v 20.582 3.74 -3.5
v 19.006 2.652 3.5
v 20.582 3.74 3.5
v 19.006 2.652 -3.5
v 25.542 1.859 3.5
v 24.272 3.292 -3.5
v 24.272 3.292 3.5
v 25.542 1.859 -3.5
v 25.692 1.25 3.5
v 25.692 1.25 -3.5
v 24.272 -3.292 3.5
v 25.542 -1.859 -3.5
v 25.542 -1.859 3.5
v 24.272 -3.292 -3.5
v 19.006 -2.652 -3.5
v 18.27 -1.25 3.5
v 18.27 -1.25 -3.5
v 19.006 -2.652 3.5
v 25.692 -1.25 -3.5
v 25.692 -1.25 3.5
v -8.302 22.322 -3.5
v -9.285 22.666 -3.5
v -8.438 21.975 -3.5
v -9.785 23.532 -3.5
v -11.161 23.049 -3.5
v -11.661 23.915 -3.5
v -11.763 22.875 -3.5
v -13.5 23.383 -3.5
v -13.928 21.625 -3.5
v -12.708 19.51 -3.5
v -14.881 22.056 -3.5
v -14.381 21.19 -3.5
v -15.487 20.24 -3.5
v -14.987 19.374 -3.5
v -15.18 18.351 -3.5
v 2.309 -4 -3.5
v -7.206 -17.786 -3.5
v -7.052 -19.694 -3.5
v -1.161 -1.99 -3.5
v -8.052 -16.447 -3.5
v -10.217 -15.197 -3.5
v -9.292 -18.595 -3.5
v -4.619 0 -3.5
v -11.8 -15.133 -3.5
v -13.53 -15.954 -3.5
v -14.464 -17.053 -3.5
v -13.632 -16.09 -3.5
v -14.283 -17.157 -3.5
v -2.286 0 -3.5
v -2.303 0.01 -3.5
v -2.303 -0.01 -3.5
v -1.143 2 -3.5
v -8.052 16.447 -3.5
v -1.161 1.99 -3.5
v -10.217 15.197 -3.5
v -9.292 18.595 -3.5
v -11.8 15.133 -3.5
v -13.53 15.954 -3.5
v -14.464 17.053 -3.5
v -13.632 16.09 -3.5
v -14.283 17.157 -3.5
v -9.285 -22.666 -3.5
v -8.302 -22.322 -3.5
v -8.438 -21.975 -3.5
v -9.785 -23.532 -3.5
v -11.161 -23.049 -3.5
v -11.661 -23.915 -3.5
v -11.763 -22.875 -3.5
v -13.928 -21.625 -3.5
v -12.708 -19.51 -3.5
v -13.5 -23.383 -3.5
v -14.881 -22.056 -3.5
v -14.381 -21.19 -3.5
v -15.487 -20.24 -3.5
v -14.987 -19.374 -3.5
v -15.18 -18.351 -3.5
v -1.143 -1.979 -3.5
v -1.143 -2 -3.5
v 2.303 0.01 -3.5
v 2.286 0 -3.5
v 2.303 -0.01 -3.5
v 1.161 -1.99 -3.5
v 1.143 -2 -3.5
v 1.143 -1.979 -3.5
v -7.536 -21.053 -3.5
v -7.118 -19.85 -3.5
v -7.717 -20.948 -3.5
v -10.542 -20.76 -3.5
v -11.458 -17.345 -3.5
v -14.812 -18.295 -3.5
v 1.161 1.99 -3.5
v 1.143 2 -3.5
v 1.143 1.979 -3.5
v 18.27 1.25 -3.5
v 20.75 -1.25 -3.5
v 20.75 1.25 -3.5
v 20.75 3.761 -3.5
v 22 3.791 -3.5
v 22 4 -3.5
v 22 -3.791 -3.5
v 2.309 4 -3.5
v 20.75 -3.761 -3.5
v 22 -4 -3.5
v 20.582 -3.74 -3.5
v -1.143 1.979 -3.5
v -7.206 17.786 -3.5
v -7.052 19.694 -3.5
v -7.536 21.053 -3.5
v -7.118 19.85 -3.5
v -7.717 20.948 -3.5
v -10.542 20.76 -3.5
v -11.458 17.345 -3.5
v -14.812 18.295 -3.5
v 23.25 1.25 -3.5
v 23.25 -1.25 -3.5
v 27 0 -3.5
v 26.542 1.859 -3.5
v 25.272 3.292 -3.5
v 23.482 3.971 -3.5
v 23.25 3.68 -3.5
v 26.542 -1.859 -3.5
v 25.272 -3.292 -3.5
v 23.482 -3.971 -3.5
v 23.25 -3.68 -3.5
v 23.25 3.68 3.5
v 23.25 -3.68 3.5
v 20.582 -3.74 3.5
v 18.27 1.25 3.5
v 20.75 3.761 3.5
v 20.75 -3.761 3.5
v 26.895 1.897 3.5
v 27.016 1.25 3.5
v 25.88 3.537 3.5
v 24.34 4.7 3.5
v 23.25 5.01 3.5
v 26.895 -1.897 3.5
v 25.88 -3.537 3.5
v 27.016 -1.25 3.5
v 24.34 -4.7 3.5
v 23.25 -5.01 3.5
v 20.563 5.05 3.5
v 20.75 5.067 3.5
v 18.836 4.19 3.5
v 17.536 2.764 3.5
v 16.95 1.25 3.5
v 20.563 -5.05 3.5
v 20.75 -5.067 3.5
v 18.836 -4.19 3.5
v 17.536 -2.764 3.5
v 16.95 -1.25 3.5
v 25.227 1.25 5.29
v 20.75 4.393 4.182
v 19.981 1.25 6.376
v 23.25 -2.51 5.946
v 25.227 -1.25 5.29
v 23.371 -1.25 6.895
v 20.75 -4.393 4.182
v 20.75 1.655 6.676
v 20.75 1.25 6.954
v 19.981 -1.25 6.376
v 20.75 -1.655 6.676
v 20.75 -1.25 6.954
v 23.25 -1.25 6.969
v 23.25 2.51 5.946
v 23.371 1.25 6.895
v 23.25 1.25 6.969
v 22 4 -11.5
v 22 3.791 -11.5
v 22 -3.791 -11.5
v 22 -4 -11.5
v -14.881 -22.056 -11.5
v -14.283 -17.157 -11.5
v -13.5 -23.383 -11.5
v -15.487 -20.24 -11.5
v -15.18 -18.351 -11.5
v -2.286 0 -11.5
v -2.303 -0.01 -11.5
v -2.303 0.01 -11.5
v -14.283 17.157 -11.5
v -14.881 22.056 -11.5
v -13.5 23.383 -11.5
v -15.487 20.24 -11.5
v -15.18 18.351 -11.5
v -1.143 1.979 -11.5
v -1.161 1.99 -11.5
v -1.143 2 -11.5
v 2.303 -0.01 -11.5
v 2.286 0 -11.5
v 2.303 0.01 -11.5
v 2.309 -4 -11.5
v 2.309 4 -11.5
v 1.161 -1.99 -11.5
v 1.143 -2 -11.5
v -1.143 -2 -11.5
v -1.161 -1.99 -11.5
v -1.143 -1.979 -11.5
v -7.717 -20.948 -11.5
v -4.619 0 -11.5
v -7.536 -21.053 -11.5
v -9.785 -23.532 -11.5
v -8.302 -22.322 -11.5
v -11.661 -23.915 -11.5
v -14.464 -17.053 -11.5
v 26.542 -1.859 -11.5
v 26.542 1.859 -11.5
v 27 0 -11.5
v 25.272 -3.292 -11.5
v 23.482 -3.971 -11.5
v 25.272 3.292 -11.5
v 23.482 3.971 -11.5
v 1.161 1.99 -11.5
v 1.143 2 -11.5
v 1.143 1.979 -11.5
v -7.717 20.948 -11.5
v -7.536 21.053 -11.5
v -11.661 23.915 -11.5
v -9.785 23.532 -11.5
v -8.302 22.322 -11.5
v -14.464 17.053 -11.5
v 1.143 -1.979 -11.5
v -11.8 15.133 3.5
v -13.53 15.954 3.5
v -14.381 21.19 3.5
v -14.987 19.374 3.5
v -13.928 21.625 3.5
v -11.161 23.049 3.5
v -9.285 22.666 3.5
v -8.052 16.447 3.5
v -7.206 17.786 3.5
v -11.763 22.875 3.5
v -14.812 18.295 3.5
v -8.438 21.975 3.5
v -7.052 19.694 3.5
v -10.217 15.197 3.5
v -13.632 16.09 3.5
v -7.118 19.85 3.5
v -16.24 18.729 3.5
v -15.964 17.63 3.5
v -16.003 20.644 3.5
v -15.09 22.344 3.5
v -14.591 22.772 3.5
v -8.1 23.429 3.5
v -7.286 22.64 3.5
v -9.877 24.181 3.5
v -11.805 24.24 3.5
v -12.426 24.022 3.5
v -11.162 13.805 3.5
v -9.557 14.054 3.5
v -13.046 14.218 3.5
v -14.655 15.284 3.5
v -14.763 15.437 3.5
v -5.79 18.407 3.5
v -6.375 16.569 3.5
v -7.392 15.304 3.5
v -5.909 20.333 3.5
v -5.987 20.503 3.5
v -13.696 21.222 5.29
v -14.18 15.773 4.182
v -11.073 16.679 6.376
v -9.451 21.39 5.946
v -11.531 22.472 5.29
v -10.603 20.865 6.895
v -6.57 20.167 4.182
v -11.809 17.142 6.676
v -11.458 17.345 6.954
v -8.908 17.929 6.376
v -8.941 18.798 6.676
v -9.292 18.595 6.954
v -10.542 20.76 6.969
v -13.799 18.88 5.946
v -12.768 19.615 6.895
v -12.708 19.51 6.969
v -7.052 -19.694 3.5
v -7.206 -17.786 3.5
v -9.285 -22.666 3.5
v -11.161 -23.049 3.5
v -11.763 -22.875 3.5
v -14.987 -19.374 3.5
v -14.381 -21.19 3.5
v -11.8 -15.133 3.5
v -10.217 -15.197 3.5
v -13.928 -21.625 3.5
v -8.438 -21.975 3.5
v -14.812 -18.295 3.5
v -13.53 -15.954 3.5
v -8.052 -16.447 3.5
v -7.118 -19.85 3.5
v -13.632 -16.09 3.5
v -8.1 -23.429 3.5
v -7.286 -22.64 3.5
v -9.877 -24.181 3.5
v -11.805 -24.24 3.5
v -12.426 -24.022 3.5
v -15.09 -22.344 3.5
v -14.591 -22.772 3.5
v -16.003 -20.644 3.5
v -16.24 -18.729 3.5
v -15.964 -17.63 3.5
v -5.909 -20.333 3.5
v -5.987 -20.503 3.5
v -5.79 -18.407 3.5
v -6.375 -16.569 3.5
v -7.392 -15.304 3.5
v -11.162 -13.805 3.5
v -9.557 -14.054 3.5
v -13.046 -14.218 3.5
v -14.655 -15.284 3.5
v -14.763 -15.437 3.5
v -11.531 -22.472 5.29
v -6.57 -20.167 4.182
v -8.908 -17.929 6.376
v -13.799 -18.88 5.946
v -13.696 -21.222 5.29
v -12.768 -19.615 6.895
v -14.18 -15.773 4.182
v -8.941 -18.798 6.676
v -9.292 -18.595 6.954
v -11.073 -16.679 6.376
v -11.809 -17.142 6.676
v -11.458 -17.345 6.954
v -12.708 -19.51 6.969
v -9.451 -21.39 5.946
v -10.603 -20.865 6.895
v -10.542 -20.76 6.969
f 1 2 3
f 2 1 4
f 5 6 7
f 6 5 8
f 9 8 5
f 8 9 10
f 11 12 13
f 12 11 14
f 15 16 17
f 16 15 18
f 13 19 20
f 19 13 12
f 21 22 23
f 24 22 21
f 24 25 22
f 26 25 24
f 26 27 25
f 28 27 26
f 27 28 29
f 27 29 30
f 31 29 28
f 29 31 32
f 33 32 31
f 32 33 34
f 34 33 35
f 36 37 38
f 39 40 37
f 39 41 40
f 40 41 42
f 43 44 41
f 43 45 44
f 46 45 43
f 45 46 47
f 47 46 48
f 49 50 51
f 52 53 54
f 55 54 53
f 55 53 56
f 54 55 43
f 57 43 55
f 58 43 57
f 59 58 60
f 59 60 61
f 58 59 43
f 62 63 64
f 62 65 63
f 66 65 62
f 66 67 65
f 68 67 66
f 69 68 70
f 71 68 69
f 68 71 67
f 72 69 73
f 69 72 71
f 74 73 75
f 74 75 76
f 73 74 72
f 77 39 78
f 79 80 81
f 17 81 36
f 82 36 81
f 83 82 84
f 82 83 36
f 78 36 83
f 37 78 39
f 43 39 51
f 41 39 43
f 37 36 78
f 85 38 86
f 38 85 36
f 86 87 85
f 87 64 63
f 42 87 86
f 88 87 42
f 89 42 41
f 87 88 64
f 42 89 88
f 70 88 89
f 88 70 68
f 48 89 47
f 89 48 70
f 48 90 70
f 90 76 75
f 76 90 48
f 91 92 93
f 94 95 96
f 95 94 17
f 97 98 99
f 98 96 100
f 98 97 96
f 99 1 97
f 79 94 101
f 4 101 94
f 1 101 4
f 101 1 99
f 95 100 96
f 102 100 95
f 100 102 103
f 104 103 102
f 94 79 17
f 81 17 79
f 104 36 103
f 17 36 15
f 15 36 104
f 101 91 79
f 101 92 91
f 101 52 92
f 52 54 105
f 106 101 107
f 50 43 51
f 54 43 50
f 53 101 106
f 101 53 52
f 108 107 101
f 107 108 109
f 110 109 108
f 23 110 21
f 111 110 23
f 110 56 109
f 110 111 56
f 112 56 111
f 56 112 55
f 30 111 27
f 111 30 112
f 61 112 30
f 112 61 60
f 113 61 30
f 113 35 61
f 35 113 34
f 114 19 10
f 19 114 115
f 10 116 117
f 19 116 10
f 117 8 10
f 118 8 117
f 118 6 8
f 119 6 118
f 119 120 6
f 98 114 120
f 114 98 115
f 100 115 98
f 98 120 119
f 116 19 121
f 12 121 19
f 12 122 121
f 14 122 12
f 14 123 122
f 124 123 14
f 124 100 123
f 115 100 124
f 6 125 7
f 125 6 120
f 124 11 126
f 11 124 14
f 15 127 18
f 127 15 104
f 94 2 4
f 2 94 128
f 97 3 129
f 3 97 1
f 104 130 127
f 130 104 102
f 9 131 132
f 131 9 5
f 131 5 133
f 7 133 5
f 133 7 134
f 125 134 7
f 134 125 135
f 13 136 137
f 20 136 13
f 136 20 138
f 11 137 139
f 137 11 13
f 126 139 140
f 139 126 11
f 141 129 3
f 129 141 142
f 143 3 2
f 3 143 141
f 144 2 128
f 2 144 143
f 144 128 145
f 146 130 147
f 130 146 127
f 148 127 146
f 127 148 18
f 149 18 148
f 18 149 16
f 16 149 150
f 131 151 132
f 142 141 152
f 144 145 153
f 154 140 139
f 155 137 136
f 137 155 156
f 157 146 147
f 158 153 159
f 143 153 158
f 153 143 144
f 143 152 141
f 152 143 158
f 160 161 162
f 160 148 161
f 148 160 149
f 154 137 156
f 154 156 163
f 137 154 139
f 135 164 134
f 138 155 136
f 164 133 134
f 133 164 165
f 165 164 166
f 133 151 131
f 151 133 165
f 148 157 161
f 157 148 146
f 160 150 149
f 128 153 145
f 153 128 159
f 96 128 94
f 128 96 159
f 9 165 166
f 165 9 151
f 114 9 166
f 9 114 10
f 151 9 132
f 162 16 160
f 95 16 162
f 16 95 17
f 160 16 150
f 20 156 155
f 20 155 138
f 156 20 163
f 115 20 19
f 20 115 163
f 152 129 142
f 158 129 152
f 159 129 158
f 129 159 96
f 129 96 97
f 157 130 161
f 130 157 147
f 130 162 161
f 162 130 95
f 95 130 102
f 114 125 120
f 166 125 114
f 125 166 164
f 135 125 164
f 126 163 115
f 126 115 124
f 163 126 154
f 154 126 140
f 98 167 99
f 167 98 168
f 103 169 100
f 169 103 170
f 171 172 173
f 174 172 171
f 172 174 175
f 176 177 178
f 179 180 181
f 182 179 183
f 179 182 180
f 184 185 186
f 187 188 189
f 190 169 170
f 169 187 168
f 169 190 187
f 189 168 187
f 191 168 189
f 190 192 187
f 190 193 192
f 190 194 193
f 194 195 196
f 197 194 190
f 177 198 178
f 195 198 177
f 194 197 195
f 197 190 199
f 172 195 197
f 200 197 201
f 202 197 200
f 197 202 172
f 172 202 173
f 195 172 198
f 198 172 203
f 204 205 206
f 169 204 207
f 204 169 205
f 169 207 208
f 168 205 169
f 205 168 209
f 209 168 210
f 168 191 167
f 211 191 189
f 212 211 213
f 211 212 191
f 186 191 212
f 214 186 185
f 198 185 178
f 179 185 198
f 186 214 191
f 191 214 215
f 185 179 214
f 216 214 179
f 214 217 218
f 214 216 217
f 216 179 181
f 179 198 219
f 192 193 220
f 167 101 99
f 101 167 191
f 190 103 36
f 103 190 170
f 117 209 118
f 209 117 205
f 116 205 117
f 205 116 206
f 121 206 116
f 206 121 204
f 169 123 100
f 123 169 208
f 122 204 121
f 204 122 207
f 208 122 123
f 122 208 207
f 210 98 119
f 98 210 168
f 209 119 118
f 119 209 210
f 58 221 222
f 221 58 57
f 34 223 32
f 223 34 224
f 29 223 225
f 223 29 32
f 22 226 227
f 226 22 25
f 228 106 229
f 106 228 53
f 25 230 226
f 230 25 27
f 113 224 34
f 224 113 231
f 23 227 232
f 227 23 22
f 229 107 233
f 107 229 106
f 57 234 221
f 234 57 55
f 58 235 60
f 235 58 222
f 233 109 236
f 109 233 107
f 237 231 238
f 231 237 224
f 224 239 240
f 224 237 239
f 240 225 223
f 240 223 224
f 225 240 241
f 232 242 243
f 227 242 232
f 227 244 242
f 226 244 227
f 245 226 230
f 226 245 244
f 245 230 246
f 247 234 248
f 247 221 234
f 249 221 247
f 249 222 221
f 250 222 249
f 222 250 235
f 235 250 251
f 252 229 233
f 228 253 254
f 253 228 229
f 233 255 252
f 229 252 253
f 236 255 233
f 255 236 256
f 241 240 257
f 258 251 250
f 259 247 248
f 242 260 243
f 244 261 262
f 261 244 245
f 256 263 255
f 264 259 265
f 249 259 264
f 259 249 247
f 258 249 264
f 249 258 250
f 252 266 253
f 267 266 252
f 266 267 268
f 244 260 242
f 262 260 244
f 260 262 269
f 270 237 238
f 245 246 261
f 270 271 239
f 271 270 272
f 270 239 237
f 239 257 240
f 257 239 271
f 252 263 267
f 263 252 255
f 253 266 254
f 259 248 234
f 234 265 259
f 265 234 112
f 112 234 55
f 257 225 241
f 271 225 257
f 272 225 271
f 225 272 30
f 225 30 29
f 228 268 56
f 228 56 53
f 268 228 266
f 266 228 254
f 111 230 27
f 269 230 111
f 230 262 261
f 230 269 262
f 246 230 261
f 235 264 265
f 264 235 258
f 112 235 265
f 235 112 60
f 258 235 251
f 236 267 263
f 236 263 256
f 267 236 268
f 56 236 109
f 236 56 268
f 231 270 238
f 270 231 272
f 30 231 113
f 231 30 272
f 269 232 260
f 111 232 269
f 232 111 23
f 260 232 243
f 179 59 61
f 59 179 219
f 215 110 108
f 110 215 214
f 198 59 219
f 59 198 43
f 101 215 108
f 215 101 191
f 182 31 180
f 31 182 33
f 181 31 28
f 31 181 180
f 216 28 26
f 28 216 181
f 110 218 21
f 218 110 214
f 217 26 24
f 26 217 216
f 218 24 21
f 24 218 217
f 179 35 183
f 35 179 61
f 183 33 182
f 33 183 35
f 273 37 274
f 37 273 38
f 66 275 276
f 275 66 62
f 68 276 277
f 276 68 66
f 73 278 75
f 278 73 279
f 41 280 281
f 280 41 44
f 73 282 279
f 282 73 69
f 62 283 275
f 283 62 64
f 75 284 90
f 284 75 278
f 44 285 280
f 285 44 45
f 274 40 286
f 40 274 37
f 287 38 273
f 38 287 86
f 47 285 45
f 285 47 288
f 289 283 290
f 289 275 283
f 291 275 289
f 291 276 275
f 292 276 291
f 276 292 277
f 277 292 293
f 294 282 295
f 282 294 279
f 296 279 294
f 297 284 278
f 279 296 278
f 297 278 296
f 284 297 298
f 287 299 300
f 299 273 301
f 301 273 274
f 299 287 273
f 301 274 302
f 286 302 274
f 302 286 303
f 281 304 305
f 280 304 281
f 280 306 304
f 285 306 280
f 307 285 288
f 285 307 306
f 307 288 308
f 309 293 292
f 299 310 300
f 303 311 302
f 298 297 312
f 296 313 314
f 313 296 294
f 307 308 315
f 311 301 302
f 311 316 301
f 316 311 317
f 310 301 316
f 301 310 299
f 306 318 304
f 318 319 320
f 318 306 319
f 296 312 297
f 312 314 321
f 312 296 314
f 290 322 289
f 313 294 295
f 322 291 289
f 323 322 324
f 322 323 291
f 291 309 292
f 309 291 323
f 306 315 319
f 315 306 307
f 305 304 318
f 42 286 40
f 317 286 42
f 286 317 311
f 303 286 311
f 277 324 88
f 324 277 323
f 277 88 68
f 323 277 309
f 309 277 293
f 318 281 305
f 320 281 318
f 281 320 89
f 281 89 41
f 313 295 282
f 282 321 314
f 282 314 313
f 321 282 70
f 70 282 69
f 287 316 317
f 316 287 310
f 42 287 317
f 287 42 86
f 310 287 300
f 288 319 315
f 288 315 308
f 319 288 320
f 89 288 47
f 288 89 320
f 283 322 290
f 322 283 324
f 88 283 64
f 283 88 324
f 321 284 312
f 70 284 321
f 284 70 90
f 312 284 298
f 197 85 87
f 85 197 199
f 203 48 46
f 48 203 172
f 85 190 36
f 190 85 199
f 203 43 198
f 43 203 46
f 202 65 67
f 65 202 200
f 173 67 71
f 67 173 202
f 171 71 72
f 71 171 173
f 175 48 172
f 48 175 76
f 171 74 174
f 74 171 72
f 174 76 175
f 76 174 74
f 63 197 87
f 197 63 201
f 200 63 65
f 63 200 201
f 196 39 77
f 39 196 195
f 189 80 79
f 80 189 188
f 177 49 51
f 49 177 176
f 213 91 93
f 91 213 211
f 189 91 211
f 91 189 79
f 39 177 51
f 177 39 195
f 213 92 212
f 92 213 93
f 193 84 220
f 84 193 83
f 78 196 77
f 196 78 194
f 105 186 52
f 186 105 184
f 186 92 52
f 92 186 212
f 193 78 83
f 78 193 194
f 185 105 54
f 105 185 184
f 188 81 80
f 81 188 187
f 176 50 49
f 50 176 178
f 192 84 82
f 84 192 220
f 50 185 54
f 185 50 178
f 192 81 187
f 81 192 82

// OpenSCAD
include <MCAD/shapes.scad>

tube_od = 8;
tube_id = 6;

// Yet to do: Make casing, which holds the tube & motor in place.
// Top part, which holds the beaings in -- complement of barbs, holds tubing down.

// 608 bearings, 22 x 8 x 7
bearing_id = 8;
bearing_od = 22;
bearing_height = 7;

pump_dia = bearing_od * 3;

number_pinchers = 3;

difference() {
 for (i=[0:number_pinchers-1]) {
  rotate(a=i*360/number_pinchers, v=[0, 0, 1])
   pinch_arm_assy(bearing_id, bearing_od, bearing_height, pump_dia);
 }

 hexagon(4, 40);
}

module pinch_arm_assy(id, od, height, pump_dia) {
 support_width = id;
 support_height = id;

 // FIXME: Place the bearing based on wall thickness of tube? 
 translate([pump_dia/2-bearing_od/2, 0, -bearing_height/2])
  union() {
   % bearing(bearing_id, bearing_od, bearing_height);
   bearing_hook(bearing_id, bearing_od, bearing_height);
   translate([-(pump_dia/2-bearing_od/2), -support_width/2, -support_height])
    cube([pump_dia/2-bearing_od/2, support_width, support_height]);

   translate([1, 0, -support_height])
    cylinder(h=support_height, r=support_width/2);
  }
}

module bearing_hook(id, od, height) {
 barb_margin = 2.5;
 barb_dia = id+barb_margin;
 barb_r   = barb_dia/2;

 echo("Barb margin: ", barb_margin);
 echo("Barb tall bit width: ", (id-barb_margin)/2);
 echo("Barb margin too big: ", barb_margin > id ? "yes" : "no");
 
 difference() {
  union() {
   cylinder(r=id/2, h=height);

   translate([0, 0, height])
    cylinder(r1=barb_r, r2=0, h=barb_r);
  } 

  translate([-(id+barb_margin+1), -barb_margin/2, -1])
   cube([2*(id+barb_margin+1), barb_margin, height+id+barb_margin+2]);
 
  rotate(a=90, v=[0, 0, 1])
   translate([-(id+barb_margin+1), -barb_margin/2, -1])
    cube([2*(id+barb_margin+1), barb_margin, height+id+barb_margin+2]);
 }
}

% union() {
 difference() {
  torus(tube_od/2, pump_dia/2);
  translate([0, -pump_dia/2-tube_od/2, -tube_od/2])
   cube([pump_dia/2+tube_od, pump_dia+tube_od, tube_od]);
 }

 translate([0, pump_dia/2, 0])
  rotate(a=90, v=[0,1,0])
   cylinder(r=tube_od/2, h=pump_dia);

 translate([0, -pump_dia/2, 0])
  rotate(a=90, v=[0,1,0])
   cylinder(r=tube_od/2, h=pump_dia);
}

module bearing(id, od, height) {
  difference() {
    cylinder(r=od/2, h=height);
    translate([0, 0, -0.05])
     cylinder(r=id/2, h=height+0.1);
  }
}

module torus(small, big) {
 rotate_extrude(convexity=10) {
  translate([big, 0, 0]) {
   circle(r=small);
  }
 }
}
